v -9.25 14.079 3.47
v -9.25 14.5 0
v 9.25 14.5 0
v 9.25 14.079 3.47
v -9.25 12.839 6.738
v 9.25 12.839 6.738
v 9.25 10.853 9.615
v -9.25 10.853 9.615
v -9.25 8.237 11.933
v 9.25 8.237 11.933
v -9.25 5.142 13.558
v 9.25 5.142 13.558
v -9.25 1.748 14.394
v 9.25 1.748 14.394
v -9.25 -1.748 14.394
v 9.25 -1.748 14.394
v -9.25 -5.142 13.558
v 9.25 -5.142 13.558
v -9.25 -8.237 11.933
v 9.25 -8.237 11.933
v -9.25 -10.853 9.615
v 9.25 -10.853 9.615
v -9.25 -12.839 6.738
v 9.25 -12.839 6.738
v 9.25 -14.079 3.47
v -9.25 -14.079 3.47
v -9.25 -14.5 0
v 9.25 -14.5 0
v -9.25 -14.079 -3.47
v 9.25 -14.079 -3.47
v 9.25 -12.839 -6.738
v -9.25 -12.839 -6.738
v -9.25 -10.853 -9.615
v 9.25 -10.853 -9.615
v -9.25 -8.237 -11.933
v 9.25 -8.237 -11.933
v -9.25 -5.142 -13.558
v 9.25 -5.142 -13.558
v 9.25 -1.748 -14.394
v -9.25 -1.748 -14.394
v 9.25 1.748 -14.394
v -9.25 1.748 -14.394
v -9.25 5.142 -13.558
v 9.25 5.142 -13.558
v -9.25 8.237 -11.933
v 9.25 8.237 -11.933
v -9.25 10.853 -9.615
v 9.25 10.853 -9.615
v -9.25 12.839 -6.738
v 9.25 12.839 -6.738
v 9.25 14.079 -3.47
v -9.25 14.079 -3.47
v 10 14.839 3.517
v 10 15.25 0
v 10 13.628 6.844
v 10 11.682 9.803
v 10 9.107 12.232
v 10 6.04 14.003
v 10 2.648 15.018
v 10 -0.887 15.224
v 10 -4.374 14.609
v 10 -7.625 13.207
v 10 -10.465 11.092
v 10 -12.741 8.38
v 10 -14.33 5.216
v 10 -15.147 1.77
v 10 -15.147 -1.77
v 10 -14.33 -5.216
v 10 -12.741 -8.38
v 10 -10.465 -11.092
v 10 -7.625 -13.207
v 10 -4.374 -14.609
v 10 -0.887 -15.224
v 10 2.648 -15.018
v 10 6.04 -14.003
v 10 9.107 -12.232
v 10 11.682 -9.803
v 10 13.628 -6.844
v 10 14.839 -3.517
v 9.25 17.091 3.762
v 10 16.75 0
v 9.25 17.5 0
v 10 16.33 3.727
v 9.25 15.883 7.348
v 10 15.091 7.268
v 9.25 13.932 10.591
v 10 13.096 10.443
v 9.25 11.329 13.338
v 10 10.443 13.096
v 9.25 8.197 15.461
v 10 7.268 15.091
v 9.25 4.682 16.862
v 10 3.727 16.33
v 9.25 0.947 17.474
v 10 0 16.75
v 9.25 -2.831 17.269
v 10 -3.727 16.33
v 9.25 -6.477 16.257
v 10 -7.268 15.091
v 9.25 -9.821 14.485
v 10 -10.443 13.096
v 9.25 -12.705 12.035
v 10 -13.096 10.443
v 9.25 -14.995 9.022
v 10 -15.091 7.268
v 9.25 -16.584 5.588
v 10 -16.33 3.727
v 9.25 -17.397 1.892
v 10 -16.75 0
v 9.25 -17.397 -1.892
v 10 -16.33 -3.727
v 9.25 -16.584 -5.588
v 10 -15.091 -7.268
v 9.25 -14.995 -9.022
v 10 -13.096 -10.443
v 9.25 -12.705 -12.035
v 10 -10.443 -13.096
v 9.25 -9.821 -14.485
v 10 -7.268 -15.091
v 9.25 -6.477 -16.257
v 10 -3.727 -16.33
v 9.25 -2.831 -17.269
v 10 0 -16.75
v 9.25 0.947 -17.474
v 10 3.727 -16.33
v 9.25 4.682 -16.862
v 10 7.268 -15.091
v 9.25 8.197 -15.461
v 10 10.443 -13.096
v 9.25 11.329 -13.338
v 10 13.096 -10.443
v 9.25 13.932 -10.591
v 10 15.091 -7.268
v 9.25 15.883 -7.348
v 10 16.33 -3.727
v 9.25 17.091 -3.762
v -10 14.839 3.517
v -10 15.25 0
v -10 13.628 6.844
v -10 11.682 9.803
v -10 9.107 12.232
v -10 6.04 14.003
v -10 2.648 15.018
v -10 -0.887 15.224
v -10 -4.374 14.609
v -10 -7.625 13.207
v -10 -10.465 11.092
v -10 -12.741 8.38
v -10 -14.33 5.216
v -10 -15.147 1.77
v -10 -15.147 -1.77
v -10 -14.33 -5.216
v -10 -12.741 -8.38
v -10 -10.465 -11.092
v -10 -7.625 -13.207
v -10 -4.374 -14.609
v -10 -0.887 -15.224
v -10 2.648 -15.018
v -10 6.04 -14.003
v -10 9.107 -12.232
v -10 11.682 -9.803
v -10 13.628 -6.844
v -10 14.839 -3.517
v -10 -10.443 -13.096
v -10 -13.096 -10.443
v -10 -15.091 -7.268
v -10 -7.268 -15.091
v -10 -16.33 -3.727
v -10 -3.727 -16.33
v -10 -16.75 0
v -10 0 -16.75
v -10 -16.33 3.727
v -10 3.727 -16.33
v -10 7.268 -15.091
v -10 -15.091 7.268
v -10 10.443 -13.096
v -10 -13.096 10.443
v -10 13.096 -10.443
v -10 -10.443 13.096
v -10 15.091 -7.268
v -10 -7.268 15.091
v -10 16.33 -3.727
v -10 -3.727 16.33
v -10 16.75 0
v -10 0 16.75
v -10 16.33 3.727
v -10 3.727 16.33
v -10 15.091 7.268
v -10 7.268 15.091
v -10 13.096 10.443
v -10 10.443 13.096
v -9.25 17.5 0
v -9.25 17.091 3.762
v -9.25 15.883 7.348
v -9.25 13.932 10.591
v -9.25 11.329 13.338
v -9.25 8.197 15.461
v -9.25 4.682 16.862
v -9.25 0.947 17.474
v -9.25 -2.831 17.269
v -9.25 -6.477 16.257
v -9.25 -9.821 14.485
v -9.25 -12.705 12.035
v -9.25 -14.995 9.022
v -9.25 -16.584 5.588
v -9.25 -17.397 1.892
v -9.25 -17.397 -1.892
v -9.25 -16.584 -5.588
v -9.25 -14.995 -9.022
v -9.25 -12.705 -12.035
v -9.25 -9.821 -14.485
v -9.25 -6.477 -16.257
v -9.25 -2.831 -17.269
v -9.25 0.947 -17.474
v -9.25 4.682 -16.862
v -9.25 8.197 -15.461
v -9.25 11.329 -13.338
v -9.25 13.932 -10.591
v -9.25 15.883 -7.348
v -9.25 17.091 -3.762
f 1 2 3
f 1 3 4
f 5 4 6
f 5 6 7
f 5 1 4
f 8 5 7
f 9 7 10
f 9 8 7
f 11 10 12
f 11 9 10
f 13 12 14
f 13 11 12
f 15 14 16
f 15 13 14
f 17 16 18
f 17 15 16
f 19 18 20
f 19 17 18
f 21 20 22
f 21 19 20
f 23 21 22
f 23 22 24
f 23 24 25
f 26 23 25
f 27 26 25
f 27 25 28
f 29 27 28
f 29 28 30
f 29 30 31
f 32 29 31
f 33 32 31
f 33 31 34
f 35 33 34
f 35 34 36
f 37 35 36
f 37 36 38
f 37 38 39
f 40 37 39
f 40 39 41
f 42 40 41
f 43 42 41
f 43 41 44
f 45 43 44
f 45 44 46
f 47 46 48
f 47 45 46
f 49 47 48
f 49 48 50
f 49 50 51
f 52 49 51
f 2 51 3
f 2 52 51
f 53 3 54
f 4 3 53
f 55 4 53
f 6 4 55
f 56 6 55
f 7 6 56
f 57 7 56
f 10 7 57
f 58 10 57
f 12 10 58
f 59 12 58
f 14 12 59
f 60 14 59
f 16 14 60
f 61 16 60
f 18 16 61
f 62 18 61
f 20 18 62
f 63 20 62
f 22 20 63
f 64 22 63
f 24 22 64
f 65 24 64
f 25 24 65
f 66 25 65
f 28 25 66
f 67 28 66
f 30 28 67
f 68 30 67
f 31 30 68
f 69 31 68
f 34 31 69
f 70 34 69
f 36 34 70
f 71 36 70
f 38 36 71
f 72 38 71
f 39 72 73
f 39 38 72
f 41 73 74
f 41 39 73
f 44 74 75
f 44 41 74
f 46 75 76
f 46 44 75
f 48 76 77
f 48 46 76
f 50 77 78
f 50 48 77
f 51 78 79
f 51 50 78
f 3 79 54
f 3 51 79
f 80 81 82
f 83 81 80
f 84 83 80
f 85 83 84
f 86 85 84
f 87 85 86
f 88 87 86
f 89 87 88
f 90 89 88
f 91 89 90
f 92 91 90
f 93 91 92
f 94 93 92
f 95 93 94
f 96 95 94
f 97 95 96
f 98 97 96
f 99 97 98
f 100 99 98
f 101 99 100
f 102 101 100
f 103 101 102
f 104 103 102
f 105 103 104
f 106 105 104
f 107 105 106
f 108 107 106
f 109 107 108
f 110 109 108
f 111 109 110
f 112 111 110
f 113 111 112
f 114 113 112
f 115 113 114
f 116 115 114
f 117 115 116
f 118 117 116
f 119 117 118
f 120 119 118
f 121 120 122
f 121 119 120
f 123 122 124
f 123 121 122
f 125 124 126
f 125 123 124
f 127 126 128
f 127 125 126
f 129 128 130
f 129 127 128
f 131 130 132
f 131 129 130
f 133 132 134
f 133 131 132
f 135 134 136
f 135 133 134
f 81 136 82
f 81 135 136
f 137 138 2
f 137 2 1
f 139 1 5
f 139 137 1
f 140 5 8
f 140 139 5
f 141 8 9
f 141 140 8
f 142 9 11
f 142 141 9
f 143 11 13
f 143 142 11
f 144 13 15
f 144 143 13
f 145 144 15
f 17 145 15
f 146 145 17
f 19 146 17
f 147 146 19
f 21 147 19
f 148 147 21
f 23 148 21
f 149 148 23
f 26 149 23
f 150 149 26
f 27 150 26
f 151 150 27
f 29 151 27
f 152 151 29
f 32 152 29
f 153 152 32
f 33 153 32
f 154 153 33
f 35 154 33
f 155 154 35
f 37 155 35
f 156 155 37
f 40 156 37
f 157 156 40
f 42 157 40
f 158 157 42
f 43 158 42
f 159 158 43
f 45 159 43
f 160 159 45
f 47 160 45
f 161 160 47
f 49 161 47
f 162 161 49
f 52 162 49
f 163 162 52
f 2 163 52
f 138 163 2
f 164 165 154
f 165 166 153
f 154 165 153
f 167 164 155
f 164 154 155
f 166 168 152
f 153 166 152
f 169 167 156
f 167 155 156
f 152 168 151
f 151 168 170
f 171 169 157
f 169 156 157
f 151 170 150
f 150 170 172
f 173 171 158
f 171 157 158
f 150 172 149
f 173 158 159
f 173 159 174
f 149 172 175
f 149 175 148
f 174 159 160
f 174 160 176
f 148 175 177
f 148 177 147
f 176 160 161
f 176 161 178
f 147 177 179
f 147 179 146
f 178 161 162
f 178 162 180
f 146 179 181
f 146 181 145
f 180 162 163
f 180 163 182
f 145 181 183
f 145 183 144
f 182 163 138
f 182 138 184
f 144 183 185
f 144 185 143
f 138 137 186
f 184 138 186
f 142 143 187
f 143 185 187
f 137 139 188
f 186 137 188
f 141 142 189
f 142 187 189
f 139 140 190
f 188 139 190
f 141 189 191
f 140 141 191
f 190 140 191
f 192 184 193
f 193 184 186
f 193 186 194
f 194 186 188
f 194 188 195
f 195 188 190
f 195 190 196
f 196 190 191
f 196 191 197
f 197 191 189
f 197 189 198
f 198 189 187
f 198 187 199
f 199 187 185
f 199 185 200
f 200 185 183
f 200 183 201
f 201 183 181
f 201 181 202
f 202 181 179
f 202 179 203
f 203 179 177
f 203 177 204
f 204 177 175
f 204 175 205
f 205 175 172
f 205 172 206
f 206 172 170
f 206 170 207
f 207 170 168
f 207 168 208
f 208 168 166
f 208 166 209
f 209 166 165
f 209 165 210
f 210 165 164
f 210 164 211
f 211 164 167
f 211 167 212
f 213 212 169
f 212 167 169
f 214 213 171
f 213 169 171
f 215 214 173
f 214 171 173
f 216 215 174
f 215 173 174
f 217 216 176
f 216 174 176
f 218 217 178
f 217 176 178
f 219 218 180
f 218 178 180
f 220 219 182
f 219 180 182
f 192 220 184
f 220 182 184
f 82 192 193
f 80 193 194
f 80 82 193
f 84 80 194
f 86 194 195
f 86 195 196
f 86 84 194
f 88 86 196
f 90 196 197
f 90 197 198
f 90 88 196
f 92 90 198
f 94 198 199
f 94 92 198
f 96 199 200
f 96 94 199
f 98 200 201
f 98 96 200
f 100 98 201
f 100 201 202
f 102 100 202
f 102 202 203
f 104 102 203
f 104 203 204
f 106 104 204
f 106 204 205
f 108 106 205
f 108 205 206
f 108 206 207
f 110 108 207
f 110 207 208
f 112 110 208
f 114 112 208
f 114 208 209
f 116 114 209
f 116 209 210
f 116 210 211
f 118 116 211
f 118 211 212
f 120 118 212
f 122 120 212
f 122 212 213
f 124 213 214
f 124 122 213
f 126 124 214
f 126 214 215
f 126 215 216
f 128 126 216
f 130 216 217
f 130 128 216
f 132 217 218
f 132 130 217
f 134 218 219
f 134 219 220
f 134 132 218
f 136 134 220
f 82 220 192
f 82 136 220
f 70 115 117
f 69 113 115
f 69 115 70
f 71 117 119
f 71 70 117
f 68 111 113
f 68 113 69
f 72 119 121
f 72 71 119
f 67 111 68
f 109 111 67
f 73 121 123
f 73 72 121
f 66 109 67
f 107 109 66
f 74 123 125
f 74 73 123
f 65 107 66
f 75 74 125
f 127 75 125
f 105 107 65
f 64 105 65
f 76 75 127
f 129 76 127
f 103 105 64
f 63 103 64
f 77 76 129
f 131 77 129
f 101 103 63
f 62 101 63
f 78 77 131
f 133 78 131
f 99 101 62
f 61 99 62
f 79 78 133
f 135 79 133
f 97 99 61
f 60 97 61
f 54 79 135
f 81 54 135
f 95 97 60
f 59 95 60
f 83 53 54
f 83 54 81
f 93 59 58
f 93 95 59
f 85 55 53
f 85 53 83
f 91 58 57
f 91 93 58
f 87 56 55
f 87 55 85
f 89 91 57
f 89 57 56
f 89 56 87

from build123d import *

# Parameters (mm, degrees)
F0_R     = 17.5
F0_R_2   = 14.5
F1_DEPTH = 10
F2_SIZE  = 0.75


with BuildPart() as f1:
    # F0 (on Right) → F1 (new body, symmetric)
    with BuildSketch(Plane.YZ):
        Circle(F0_R)
        Circle(F0_R_2, mode=Mode.SUBTRACT)
    extrude(amount=F1_DEPTH, both=True)

    # F2
    f2_edges = [f1.edges().sort_by_distance(p)[0] for p in [
        (-10, -17.5, 0),
        (10, -17.5, 0),
        (10, -14.5, 0),
        (-10, -14.5, 0),
    ]]
    chamfer(f2_edges, length=F2_SIZE)


solid = f1.part
